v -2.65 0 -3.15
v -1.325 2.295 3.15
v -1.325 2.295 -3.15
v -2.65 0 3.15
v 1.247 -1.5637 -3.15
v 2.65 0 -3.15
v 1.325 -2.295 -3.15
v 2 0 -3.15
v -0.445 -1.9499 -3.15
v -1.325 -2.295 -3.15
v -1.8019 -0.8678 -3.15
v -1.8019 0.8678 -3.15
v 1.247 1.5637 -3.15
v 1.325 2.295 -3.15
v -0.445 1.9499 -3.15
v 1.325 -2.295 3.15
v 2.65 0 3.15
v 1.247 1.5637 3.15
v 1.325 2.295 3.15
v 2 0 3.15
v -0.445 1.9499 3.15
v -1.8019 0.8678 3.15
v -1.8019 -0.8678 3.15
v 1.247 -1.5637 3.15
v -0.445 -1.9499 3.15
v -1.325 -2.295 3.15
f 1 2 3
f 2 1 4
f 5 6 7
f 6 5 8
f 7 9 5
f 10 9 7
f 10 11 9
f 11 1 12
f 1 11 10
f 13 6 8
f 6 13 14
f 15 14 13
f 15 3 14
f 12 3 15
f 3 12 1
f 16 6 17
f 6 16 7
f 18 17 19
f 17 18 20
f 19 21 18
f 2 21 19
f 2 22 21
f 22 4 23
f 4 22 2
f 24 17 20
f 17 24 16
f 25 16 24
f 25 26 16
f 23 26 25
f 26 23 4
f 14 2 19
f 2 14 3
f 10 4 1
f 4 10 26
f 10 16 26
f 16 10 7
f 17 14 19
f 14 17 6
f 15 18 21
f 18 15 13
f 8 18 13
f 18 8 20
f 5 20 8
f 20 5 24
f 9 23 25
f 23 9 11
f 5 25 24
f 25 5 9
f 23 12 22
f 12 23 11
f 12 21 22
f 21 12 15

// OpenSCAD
// Parameters
thread_diameter_mm = 4; //[2:8:0.1]
across_flats_mm = 5.3; //[2.65:10.6:0.1]
thickness_mm = 6.3; //[3.15:12.6:0.1]
tolerance_mm = 0; //[0:0.6:0.05]
eps_mm = 0.8; //[0.2:2:0.1]

// Hexagonal Nut - complete geometry
module hex_nut() {
  color("DimGray") {
    difference() {
      // Hexagonal body
      intersection() {
        // Hexagonal profile
        linear_extrude(height = thickness_mm, center = true) {
          polygon(points = [
            [across_flats_mm/2, 0],
            [across_flats_mm/4, across_flats_mm*sqrt(3)/4],
            [-across_flats_mm/4, across_flats_mm*sqrt(3)/4],
            [-across_flats_mm/2, 0],
            [-across_flats_mm/4, -across_flats_mm*sqrt(3)/4],
            [across_flats_mm/4, -across_flats_mm*sqrt(3)/4]
          ]);
        }
        // Cylinder to control thickness
        cube([across_flats_mm, across_flats_mm, thickness_mm], center = true);
      }
      // Central through-hole
      cylinder(r = (thread_diameter_mm + tolerance_mm)/2, h = thickness_mm + 2*eps_mm, center = true);
    }
  }
}

// Assembly
module assembly() {
  hex_nut();
}

assembly();
